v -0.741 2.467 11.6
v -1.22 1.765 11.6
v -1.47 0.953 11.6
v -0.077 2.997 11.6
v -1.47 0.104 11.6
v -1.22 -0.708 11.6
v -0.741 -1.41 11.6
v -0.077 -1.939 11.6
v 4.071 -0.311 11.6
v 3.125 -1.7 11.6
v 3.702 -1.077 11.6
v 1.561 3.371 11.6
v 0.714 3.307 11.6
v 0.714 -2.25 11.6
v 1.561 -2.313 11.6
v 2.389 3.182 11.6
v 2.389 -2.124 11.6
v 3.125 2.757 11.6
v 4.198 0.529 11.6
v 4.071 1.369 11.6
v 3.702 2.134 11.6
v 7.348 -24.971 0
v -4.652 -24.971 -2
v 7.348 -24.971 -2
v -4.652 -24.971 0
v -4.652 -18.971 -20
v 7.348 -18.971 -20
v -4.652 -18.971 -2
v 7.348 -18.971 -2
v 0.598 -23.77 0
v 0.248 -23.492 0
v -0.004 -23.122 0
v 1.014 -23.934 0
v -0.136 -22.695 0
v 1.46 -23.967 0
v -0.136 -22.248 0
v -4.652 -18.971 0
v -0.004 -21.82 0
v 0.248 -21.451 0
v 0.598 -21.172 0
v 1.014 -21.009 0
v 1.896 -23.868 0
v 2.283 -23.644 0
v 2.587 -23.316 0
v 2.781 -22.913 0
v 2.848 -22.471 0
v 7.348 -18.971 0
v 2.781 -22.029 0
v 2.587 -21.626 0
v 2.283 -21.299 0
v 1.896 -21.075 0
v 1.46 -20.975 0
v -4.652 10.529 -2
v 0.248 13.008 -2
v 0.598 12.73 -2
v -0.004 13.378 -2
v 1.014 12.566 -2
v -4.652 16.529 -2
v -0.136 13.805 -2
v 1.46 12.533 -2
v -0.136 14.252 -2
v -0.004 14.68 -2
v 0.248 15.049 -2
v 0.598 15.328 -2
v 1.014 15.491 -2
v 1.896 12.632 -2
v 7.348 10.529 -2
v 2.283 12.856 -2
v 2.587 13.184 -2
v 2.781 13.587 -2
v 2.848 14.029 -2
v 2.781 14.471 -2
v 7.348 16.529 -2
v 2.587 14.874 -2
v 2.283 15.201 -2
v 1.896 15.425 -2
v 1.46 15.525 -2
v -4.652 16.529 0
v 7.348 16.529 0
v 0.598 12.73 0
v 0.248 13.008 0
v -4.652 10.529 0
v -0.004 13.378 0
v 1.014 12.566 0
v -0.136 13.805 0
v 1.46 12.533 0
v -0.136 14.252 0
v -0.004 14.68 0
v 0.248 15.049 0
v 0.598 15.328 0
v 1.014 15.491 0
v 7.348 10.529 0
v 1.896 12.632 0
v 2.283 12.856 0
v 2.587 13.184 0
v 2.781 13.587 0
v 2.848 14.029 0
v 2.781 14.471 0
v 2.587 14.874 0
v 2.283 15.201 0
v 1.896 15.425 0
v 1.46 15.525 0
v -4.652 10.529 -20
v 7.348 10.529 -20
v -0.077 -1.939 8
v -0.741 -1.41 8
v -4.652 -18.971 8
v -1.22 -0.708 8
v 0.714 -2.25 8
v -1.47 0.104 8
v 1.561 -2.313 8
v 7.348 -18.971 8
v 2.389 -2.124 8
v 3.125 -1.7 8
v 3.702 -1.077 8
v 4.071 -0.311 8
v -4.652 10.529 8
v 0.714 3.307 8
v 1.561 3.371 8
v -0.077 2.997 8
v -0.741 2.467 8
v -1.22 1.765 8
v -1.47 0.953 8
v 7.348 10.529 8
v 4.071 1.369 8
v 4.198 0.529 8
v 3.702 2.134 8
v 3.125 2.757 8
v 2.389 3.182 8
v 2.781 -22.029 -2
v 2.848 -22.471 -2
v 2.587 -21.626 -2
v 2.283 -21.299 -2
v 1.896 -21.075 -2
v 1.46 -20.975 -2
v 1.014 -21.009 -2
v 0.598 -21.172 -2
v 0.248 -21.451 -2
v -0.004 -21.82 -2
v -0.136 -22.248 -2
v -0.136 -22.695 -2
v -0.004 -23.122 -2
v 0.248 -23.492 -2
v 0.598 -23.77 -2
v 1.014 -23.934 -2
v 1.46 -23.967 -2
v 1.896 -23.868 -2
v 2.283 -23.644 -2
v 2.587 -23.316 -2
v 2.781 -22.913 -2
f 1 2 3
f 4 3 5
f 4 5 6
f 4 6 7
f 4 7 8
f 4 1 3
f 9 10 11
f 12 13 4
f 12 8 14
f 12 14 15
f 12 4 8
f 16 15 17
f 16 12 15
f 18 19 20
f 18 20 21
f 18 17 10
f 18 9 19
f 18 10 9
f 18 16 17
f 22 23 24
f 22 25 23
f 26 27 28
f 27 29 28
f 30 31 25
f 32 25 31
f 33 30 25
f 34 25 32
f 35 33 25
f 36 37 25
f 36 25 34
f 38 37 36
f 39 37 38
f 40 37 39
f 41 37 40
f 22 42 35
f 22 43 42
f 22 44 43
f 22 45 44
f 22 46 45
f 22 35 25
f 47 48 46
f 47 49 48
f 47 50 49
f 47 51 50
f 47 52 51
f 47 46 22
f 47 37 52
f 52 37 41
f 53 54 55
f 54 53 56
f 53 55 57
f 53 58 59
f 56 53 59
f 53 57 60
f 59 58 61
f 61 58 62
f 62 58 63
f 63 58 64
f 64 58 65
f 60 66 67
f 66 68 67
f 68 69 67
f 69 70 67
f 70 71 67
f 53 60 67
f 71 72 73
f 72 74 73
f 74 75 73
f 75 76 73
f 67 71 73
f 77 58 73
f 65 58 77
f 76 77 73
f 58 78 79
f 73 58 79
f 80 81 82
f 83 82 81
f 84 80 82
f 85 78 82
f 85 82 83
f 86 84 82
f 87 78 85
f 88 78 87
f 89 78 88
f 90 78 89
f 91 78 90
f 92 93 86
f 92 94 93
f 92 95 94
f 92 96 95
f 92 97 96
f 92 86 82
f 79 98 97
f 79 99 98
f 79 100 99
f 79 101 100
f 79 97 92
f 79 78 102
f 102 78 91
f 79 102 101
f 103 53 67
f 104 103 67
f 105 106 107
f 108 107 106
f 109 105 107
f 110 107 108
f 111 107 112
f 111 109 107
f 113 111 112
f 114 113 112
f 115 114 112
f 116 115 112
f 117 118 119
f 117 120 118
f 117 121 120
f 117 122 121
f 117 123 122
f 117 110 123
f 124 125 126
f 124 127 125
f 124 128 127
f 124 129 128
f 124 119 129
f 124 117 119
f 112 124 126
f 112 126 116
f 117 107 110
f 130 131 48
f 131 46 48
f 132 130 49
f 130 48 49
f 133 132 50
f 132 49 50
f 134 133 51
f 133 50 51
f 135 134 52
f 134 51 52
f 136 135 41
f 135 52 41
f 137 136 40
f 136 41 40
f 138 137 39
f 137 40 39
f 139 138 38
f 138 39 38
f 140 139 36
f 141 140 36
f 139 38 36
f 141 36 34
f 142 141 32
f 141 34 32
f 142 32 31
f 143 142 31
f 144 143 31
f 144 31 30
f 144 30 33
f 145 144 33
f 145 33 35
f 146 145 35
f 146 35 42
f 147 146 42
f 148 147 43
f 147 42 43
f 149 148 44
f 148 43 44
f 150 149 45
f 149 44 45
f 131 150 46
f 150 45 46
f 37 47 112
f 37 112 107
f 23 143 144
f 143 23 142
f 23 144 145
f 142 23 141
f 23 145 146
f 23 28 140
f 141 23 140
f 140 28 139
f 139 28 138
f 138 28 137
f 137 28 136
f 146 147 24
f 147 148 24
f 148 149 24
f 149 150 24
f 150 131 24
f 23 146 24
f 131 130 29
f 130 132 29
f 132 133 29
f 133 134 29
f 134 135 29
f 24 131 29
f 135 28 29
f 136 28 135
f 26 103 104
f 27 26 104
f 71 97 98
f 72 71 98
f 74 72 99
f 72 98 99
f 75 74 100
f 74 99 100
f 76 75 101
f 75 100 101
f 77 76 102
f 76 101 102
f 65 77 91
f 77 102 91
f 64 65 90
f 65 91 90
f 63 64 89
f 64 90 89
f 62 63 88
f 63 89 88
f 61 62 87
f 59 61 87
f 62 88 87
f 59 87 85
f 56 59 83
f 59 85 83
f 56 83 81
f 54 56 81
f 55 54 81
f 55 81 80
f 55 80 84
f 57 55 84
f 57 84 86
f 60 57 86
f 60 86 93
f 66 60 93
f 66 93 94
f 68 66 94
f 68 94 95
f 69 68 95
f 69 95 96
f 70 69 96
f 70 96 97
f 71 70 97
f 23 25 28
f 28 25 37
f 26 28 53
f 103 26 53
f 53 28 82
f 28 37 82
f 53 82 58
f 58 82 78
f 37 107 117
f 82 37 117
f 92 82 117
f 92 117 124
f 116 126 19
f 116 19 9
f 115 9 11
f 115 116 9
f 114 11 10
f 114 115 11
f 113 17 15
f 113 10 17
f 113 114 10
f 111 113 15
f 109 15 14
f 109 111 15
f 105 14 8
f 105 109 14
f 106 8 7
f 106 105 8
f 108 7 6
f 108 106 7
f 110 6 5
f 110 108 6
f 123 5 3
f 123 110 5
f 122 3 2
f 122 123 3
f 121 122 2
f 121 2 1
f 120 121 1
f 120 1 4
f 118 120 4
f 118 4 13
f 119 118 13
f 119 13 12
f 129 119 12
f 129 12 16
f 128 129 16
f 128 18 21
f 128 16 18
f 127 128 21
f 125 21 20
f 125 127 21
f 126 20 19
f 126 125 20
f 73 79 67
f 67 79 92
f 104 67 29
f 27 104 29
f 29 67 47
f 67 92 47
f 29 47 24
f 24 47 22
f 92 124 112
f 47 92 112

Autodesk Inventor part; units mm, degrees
ref_plane "YZ Plane" through (0, 0, 0) normal (1, 0, 0) x (0, 1, 0)
ref_plane "XZ Plane" through (0, 0, 0) normal (0, 1, 0) x (-1, 0, 0)
ref_plane "XY Plane" through (0, 0, 0) normal (0, 0, 1) x (1, 0, 0)
sketch "Sketch1" plane through (0, 0, 0) normal (0, 0, 1) x (1, 0, 0)
  line L0 (-4.6523, 10.5287) -> (7.3477, 10.5287)
  line L1 (7.3477, 10.5287) -> (7.3477, -18.9713)
  line L2 (7.3477, -18.9713) -> (-4.6523, -18.9713)
  line L3 (-4.6523, -18.9713) -> (-4.6523, 10.5287)
  line L4 (-4.6523, 10.5287) -> (-4.6523, 16.5287)
  line L5 (-4.6523, 16.5287) -> (7.3477, 16.5287)
  line L6 (7.3477, 16.5287) -> (7.3477, 10.5287)
  line L7 (-4.6523, -18.9713) -> (-4.6523, -24.9713)
  line L8 (-4.6523, -24.9713) -> (7.3477, -24.9713)
  line L9 (7.3477, -24.9713) -> (7.3477, -18.9713)
  circle A0 centre (1.3477, 14.0287) radius 1.5
  circle A1 centre (1.3477, -22.4713) radius 1.5
  point P0 (0, 0)
  dimension "d0" = 12
  dimension "d1" = 29.5
  dimension "d2" = 6
  dimension "d3" = 6
  dimension "d4" = 3
  dimension "d5" = 3
  dimension "d23" = 2.5
  dimension "d24" = 2.5
  dimension "d25" = 3.5
  dimension "d26" = 6
  dimension "d27" = 6
extrude "Extrusion1" add sketch "Sketch1" against normal blind 20 contours L0 L1 L2 L3
extrude "Extrusion2" add sketch "Sketch1" against normal blind 2 contours L4 L5 L6 L0 | L2 L9 L8 L7
extrude "Extrusion3" add sketch "Sketch1" along normal blind 8 contours L0 L1 L2 L3
sketch "Sketch3" plane through (0, 0, 8) normal (0, 0, 1) x (1, 0, 0)
  line L0 (-4.6523, 10.5287) -> (7.3477, 10.5287) projected
  circle A0 centre (1.3477, 0.5287) radius 2.85
  line L1 (-4.6523, -18.9713) -> (-4.6523, 10.5287) projected
  point P0 (0, 0)
  dimension "d18" = 5.7
  dimension "d19" = 10
  dimension "d28" = 6
extrude "Extrusion5" add sketch "Sketch3" along normal blind 3.6
properties part number "GWS servo micro MG"
